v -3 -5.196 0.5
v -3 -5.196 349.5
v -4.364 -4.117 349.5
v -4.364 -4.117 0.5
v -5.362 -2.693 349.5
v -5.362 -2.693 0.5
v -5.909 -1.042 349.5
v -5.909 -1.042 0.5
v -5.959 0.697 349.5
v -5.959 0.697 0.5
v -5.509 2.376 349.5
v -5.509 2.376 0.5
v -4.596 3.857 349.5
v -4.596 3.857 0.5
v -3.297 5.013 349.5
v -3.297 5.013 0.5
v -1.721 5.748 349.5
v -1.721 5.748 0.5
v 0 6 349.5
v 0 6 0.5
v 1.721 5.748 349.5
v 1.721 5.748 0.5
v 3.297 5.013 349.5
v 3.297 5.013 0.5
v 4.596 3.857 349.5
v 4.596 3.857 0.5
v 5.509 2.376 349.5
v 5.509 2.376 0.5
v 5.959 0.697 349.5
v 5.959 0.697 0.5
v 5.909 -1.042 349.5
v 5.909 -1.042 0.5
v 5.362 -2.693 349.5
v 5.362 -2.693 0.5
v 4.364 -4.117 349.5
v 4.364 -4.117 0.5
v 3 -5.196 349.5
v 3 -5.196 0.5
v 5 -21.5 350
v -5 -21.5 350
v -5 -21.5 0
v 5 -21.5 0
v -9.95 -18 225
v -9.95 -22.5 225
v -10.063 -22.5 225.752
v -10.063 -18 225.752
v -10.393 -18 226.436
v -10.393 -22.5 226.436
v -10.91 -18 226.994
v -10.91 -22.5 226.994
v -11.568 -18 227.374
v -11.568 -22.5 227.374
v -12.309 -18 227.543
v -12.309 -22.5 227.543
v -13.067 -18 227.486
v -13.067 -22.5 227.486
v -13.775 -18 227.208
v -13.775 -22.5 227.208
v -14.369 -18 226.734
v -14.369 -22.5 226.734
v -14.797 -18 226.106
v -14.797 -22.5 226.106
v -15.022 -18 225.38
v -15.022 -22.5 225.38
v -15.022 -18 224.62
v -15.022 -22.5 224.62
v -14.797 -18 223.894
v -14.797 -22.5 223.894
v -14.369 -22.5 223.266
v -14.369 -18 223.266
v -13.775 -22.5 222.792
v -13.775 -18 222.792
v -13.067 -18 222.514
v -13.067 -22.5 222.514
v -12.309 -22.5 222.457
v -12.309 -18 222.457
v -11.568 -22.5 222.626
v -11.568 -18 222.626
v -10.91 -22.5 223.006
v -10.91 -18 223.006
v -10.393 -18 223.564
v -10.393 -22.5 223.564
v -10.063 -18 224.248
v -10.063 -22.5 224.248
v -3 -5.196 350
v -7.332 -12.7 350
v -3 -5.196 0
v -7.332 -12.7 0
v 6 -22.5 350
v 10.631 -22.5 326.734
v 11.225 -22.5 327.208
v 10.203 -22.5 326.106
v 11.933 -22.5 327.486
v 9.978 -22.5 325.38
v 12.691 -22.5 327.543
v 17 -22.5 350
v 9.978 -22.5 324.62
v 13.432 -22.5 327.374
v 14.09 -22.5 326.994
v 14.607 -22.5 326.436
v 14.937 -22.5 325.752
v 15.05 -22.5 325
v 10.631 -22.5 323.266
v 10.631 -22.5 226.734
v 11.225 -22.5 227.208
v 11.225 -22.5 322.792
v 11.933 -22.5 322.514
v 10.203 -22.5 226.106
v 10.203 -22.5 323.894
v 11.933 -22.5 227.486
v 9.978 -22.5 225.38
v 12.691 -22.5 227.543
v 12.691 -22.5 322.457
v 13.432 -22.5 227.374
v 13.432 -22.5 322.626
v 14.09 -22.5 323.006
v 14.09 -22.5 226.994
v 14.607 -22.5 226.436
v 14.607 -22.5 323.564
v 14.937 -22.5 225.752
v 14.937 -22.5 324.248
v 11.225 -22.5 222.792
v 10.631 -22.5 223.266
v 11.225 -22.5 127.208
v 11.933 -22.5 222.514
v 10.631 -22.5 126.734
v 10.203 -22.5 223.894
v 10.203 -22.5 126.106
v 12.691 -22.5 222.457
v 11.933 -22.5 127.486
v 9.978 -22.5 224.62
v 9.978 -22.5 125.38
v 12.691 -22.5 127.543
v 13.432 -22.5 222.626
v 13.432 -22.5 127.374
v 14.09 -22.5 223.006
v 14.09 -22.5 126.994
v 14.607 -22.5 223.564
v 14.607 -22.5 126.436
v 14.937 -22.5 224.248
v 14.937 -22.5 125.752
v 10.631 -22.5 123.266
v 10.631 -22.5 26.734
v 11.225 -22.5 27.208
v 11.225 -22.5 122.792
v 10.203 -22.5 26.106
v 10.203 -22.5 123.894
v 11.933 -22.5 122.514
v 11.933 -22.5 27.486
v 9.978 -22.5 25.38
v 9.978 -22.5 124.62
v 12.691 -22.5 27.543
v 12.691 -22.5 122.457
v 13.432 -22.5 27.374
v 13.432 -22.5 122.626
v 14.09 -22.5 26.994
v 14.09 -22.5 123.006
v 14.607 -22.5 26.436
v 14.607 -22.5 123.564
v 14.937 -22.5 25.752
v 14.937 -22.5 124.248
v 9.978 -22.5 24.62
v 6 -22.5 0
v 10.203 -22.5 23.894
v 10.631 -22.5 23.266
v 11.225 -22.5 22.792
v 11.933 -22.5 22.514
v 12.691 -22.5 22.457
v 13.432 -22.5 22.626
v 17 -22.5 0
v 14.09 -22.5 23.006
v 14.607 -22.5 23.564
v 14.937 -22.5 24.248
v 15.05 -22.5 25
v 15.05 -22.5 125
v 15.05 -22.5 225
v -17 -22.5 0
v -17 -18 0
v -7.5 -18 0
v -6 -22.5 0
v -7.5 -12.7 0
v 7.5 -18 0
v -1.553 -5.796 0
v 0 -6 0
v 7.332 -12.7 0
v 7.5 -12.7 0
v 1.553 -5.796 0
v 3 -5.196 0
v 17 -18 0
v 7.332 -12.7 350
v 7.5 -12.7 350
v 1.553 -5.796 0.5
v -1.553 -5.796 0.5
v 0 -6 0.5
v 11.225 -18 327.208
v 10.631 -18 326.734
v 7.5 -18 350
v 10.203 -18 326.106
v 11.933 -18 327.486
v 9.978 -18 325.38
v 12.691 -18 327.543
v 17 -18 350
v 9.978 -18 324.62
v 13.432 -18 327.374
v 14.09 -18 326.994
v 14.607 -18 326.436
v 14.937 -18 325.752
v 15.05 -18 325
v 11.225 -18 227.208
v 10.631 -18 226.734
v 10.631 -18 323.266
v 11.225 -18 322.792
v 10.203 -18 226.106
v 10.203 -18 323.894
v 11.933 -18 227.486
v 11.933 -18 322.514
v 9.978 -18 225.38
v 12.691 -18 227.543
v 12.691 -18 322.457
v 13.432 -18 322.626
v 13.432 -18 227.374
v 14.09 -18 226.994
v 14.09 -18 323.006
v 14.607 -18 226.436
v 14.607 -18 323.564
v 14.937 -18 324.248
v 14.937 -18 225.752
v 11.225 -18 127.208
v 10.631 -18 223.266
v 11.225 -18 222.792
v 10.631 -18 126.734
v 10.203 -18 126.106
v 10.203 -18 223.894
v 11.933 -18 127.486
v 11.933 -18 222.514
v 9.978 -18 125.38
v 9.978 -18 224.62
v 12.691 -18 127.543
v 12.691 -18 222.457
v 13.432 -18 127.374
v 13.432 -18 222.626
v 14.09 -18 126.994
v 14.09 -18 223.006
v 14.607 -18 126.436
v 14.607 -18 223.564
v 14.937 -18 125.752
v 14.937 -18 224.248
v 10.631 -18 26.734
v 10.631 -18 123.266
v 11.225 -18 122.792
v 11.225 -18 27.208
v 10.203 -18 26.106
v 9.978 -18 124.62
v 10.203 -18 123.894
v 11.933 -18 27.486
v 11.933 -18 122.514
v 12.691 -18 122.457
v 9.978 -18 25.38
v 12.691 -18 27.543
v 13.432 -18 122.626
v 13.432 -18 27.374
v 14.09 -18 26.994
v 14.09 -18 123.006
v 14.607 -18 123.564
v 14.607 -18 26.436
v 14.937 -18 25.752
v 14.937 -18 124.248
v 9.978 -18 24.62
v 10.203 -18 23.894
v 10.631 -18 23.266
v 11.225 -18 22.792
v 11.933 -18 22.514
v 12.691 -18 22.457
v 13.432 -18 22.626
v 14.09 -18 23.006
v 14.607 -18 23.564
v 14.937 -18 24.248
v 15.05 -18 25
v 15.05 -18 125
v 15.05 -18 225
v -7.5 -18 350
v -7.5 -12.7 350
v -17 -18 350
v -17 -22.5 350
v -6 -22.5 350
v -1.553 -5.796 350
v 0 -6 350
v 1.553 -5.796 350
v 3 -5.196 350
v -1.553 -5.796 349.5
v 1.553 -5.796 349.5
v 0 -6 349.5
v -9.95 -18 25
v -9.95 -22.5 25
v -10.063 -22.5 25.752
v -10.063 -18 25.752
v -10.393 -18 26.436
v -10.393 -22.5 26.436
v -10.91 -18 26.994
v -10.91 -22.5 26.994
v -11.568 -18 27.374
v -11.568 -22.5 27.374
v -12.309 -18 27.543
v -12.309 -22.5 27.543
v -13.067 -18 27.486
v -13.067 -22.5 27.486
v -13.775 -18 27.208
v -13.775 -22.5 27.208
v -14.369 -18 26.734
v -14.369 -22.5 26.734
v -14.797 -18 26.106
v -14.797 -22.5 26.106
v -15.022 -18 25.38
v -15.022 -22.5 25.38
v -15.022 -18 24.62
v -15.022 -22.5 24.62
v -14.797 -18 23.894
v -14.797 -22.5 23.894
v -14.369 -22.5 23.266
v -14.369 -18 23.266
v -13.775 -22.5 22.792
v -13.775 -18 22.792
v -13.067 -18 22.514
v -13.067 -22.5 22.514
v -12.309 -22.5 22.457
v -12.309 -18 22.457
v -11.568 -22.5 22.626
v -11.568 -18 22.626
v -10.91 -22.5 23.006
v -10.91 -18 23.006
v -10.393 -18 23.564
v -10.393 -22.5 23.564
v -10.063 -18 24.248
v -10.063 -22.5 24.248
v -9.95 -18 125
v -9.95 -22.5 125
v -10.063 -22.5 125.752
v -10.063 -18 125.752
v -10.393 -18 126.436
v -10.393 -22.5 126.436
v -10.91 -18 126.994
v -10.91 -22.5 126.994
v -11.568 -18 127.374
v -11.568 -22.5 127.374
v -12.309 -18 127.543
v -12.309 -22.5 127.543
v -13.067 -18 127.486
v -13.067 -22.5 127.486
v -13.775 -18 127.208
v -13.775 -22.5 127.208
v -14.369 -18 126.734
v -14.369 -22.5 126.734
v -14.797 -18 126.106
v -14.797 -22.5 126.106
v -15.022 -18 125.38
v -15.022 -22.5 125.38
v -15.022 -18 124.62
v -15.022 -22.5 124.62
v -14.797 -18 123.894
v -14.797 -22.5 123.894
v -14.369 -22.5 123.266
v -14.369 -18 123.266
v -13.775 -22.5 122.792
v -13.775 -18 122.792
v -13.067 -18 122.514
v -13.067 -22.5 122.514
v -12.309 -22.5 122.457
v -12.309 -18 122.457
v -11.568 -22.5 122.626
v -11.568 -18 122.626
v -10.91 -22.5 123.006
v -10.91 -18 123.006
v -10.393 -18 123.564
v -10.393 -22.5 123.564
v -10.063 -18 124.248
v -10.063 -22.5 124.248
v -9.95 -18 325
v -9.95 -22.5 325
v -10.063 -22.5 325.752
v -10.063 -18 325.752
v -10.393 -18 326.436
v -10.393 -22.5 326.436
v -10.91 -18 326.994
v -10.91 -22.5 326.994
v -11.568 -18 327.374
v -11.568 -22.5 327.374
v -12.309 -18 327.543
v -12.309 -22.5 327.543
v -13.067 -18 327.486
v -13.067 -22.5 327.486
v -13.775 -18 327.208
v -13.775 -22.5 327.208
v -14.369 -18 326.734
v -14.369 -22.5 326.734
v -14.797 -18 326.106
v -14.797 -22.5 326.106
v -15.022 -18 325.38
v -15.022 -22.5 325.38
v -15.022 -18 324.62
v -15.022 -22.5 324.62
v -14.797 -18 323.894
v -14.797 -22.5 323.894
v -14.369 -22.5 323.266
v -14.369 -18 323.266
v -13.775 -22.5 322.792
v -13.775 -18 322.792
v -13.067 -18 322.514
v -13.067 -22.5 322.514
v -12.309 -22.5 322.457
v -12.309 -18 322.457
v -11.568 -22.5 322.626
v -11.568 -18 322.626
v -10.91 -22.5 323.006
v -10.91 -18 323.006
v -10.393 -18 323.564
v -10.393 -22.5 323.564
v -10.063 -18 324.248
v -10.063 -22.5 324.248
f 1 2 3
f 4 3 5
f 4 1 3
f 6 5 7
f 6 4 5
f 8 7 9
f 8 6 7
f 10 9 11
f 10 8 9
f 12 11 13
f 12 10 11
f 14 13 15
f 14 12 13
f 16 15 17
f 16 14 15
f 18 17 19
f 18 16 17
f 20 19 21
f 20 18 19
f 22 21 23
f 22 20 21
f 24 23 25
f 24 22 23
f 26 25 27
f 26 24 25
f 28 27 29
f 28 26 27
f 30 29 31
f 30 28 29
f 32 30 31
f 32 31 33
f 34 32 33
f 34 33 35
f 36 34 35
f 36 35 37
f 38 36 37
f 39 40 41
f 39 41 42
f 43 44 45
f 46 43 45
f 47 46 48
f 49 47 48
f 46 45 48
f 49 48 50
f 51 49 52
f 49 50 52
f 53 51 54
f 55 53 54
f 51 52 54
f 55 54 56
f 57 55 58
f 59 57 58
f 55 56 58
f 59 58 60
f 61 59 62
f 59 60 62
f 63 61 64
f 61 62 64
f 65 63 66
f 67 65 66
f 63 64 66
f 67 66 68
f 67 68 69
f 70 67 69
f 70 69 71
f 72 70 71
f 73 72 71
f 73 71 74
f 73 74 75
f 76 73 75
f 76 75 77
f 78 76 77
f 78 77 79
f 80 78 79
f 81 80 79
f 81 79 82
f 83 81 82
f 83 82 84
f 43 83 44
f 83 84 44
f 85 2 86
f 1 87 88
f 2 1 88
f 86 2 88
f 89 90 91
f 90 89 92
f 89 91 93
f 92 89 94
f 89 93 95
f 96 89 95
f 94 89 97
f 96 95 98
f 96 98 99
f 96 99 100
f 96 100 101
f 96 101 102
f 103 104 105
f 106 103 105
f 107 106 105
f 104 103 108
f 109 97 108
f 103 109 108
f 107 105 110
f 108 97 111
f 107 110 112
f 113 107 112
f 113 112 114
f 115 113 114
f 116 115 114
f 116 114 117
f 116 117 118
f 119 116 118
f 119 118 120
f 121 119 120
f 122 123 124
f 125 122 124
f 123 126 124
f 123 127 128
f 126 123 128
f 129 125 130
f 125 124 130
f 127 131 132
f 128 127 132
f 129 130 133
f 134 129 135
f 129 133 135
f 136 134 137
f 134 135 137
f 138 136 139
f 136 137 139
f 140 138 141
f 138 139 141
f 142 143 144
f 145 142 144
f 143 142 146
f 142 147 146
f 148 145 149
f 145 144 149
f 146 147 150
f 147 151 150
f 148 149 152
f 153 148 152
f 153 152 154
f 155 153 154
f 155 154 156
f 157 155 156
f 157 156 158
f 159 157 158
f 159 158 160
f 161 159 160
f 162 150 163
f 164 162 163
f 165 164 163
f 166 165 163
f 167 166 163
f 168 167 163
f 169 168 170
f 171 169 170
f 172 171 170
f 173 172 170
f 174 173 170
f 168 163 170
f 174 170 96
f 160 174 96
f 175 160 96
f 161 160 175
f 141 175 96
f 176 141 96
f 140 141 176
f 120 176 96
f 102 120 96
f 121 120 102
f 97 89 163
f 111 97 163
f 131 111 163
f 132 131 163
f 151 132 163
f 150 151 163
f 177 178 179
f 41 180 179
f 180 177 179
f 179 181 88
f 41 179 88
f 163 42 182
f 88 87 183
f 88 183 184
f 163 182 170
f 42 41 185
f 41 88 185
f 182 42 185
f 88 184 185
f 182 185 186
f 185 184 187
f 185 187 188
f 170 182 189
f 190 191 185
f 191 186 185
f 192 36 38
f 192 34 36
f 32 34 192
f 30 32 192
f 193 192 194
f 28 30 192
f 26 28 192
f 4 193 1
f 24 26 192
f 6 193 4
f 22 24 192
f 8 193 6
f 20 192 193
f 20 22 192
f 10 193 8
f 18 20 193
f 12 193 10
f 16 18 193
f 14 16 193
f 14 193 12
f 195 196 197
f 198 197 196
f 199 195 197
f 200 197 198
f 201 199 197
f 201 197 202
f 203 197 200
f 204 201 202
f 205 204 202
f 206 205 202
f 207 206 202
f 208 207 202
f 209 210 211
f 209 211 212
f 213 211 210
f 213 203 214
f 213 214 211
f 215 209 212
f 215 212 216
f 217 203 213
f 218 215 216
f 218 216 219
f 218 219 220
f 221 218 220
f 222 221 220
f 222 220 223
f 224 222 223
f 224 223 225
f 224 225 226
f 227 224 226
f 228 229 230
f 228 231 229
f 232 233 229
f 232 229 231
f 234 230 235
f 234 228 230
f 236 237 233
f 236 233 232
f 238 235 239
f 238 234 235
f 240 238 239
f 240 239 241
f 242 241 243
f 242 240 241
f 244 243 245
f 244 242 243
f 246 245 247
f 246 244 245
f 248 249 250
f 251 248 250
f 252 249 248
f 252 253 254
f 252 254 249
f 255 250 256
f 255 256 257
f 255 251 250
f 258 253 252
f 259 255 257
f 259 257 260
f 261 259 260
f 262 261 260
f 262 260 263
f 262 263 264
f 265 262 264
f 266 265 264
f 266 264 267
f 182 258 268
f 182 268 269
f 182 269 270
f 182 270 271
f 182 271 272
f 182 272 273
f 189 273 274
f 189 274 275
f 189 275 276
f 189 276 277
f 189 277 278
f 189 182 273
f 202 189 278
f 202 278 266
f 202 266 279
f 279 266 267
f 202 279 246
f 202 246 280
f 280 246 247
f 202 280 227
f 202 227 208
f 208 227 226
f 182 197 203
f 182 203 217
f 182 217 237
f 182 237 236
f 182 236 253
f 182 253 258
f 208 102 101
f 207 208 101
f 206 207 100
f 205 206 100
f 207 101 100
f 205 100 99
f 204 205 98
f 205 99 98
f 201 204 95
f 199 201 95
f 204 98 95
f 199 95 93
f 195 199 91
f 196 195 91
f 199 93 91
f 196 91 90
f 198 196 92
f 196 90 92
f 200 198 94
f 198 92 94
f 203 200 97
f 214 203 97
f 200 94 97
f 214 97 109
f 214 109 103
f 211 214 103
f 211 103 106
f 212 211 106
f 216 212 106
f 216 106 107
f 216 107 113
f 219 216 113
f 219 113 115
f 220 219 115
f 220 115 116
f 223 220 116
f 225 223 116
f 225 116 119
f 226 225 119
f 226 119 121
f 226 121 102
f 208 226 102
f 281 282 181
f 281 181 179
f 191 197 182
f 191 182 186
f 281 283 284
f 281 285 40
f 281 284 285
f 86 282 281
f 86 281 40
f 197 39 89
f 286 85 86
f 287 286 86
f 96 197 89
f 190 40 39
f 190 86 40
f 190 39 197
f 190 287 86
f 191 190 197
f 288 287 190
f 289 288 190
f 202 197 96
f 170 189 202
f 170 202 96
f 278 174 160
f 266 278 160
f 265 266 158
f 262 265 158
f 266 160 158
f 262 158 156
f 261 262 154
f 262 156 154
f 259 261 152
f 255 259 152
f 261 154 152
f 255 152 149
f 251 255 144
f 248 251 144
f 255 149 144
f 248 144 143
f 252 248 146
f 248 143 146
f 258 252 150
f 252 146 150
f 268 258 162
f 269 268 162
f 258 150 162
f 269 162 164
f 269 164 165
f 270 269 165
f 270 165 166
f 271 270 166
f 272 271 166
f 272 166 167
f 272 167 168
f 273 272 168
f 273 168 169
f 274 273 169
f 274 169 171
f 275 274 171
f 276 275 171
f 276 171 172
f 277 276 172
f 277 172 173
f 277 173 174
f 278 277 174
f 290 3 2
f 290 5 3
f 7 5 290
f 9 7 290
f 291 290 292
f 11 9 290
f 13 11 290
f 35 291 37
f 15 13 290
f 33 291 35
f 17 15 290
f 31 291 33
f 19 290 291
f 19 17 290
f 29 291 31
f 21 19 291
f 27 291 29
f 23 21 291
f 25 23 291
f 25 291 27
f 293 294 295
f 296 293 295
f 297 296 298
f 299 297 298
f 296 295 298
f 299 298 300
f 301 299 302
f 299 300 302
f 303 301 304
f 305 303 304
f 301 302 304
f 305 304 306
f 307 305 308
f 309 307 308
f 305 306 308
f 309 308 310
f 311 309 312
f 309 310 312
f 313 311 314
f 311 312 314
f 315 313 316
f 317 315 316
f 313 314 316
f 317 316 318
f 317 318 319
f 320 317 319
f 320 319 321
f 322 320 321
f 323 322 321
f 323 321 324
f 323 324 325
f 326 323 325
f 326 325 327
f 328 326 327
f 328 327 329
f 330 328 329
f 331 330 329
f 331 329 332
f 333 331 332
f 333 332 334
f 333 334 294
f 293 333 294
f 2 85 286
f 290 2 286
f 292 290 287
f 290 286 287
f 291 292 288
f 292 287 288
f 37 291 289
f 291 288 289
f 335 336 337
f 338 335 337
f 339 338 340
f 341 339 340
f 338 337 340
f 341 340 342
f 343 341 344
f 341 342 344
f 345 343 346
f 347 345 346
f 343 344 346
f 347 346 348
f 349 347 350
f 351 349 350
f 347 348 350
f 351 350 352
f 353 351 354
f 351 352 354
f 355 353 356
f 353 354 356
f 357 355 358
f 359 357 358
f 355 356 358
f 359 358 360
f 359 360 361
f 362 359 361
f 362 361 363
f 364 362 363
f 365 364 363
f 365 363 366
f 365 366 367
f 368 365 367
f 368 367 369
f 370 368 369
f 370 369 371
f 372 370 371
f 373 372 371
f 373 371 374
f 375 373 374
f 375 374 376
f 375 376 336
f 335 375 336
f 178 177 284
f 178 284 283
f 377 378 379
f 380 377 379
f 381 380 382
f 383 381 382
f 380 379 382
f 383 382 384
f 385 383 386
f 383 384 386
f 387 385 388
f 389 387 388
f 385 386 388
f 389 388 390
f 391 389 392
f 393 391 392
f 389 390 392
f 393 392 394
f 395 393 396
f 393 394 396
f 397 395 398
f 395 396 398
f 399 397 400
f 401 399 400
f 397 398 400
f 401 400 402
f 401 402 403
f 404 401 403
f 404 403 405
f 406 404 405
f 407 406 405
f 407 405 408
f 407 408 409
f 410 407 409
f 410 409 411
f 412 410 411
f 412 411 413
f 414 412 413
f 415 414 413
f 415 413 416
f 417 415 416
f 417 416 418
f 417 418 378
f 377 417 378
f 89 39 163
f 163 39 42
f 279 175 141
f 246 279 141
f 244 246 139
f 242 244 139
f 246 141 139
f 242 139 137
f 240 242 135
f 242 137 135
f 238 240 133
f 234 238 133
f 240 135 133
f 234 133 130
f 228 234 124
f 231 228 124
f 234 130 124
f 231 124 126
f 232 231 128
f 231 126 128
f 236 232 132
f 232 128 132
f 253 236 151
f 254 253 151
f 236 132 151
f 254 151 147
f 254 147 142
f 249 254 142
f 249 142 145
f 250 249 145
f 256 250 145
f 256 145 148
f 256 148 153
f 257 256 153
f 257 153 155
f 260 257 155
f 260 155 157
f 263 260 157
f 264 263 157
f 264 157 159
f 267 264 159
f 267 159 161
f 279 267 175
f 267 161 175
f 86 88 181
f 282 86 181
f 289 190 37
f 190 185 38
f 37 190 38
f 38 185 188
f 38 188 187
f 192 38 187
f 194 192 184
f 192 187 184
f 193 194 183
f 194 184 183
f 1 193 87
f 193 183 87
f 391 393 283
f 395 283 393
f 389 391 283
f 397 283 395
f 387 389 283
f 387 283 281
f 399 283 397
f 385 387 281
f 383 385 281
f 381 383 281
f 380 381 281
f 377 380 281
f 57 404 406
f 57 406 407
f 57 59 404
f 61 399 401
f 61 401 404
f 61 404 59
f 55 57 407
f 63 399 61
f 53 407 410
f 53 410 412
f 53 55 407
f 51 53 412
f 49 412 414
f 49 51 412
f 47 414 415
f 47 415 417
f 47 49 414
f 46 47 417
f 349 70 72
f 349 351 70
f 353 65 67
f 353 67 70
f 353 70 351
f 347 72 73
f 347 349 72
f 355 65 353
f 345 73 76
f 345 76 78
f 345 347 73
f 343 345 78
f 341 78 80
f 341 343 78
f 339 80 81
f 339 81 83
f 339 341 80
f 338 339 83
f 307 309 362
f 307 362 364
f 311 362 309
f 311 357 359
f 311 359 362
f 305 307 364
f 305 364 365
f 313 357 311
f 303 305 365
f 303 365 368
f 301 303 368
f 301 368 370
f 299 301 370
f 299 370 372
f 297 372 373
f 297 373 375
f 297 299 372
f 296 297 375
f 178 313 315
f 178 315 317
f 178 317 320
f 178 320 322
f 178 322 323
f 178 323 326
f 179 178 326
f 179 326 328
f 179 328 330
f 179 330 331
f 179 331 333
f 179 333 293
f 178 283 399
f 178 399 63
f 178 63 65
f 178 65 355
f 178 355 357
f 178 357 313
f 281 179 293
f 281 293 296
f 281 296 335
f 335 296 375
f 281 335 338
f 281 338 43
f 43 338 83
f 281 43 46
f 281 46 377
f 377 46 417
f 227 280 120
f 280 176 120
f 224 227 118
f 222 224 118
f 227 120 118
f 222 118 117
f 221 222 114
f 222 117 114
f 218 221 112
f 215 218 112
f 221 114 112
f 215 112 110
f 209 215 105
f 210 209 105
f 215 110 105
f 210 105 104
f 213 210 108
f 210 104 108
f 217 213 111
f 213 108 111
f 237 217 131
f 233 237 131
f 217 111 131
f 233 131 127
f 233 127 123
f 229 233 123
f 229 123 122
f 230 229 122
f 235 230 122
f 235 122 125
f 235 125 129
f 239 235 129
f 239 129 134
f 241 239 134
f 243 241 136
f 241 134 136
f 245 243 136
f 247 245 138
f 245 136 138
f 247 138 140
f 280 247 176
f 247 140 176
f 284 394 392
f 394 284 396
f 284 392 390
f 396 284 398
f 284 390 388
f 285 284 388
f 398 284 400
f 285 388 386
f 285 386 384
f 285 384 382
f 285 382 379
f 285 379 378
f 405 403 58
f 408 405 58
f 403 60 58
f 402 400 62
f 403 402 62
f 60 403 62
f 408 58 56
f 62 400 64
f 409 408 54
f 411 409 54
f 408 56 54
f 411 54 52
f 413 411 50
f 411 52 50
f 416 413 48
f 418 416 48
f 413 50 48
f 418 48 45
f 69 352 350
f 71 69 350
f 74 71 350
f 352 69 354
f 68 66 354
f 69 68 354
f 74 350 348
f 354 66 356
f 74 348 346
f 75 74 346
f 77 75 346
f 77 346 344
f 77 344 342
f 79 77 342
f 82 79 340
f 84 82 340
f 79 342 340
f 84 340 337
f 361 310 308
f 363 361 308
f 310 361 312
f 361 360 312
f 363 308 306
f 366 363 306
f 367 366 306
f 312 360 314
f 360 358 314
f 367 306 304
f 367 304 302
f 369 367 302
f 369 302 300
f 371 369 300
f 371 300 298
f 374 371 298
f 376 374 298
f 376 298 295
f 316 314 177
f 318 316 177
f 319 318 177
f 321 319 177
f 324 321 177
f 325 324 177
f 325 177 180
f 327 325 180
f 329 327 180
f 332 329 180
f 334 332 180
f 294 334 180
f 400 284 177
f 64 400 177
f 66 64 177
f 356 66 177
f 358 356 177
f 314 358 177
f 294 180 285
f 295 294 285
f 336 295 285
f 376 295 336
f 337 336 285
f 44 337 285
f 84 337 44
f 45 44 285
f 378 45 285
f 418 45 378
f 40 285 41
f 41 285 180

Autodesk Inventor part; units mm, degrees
ref_plane "YZ Plane" through (0, 0, 0) normal (1, 0, 0) x (0, 1, 0)
ref_plane "XZ Plane" through (0, 0, 0) normal (0, 1, 0) x (-1, 0, 0)
ref_plane "XY Plane" through (0, 0, 0) normal (0, 0, 1) x (1, 0, 0)
sketch "Sketch1" plane through (0, 0, 0) normal (0, 0, 1) x (1, 0, 0)
  circle A0 centre (0, 0) radius 6
  line L0 (-3, -5.1962) -> (-7.3323, -12.7)
  line L1 (-7.3323, -12.7) -> (7.3323, -12.7)
  line L2 (7.3323, -12.7) -> (3, -5.1962)
  line L3 (-7.5, -22.5) -> (7.5, -22.5)
  line L4 (7.5, -22.5) -> (7.5, -12.7)
  line L5 (7.5, -12.7) -> (-7.5, -12.7)
  line L6 (-7.5, -12.7) -> (-7.5, -22.5)
  line L7 (0, -12.7) -> (0, 0)
  line L8 (-17, -18) -> (17, -18)
  line L9 (17, -18) -> (17, -22.5)
  line L10 (17, -22.5) -> (-17, -22.5)
  line L11 (-17, -22.5) -> (-17, -18)
  point P0 (0, -22.5)
  dimension "d0" = 12
  dimension "d1" = 60
  dimension "d2" = 3
  dimension "d3" = 3
  dimension "d4" = 15
  dimension "d5" = 9.8
  dimension "d7" = 4.5
  dimension "d8" = 34
  dimension "d31" = 22.5
extrude "Extrusion1" add sketch "Sketch1" along normal blind 350
sketch "Sketch2" plane through (0, 0, 350) normal (0, 0, 1) x (1, 0, 0)
  arc A0 (3, -5.1962) -> (-3, -5.1962) centre (0, 0) ccw projected
  line L0 (3, -5.1962) -> (7.3323, -12.7) projected
  line L1 (7.3323, -12.7) -> (7.5, -12.7) projected
  line L2 (7.5, -12.7) -> (7.5, -18) projected
  line L3 (7.5, -18) -> (17, -18) projected
  line L4 (17, -18) -> (17, -22.5) projected
  line L5 (17, -22.5) -> (-17, -22.5) projected
  line L6 (-17, -22.5) -> (-17, -18) projected
  line L7 (-17, -18) -> (-7.5, -18) projected
  line L8 (-7.5, -18) -> (-7.5, -12.7) projected
  line L9 (-7.5, -12.7) -> (-7.3323, -12.7) projected
  line L10 (-7.3323, -12.7) -> (-3, -5.1962) projected
  line L11 (-6, -21.5) -> (6, -21.5)
  line L12 (6, -21.5) -> (6, -22.5)
  line L13 (6, -22.5) -> (-6, -22.5)
  line L14 (-6, -22.5) -> (-6, -21.5)
  point P0 (0, -22.5)
  dimension "d11" = 12
  dimension "d12" = 1
extrude "Extrusion2" cut sketch "Sketch2" against normal through all contours L5 L14 L11 L12
chamfer "Chamfer1" distance 1 angle 45 2 edges at (-6, -21.5, 175) (6, -21.5, 175)
sketch "Sketch3" plane through (-17, -22.5, 0) normal (0, -1, 0) x (1, 0, 0)
  line L0 (23, 0) -> (23, 350) construction
  line L1 (23, 350) -> (34, 350) projected
  line L2 (34, 350) -> (34, 0) projected
  line L3 (34, 0) -> (23, 0) construction
  line L4 (11, 350) -> (11, 0) construction
  line L5 (11, 0) -> (0, 0) construction
  line L6 (0, 0) -> (0, 350) projected
  line L7 (0, 350) -> (11, 350) projected
  circle A0 centre (4.5, 25) radius 2.55
  circle A1 centre (29.5, 25) radius 2.55
  line L8 (29.5, 25) -> (4.5, 25) construction
  line L9 (17, 25) -> (17, 0) construction
  dimension "d18" = 25
  dimension "d19" = 5.1
  dimension "d20" = 5.1
  dimension "d21" = 25
extrude "Extrusion3" cut sketch "Sketch3" against normal through all
pattern_linear "Rectangular Pattern1" count 4 spacing 100 along (0, 0, 1) of "Extrusion3"
sketch "Sketch4" plane through (0, 0, 0) normal (0, 0, -1) x (-1, 0, 0)
  line L0 (-5, -21.5) -> (-6, -22.5) projected
  line L1 (-5, -21.5) -> (5, -21.5) projected
  line L2 (6, -22.5) -> (5, -21.5) projected
  line L3 (17, -22.5) -> (6, -22.5) projected
  line L4 (17, -18) -> (17, -22.5) projected
  line L5 (7.5, -18) -> (17, -18) projected
  line L6 (7.5, -12.7) -> (7.5, -18) projected
  line L7 (7.3323, -12.7) -> (7.5, -12.7) projected
  line L8 (3, -5.1962) -> (7.3323, -12.7) projected
  arc A0 (3, -5.1962) -> (-3, -5.1962) centre (0, 0) ccw projected
  line L9 (-7.3323, -12.7) -> (-3, -5.1962) projected
  line L10 (-7.5, -12.7) -> (-7.3323, -12.7) projected
  line L11 (-7.5, -18) -> (-7.5, -12.7) projected
  line L12 (-17, -18) -> (-7.5, -18) projected
  line L13 (-17, -22.5) -> (-17, -18) projected
  line L14 (-6, -22.5) -> (-17, -22.5) projected
  circle A1 centre (0, 0) radius 6
extrude "Extrusion4" cut sketch "Sketch4" against normal blind 0.5 contours A0 A1
sketch "Sketch5" plane through (0, 0, 350) normal (0, 0, 1) x (1, 0, 0)
  line L0 (6, -22.5) -> (17, -22.5) projected
  line L1 (17, -22.5) -> (17, -18) projected
  line L2 (17, -18) -> (7.5, -18) projected
  line L3 (7.5, -18) -> (7.5, -12.7) projected
  line L4 (7.5, -12.7) -> (7.3323, -12.7) projected
  line L5 (7.3323, -12.7) -> (3, -5.1962) projected
  arc A0 (3, -5.1962) -> (-3, -5.1962) centre (0, 0) ccw projected
  line L6 (-3, -5.1962) -> (-7.3323, -12.7) projected
  line L7 (-7.3323, -12.7) -> (-7.5, -12.7) projected
  line L8 (-7.5, -12.7) -> (-7.5, -18) projected
  line L9 (-7.5, -18) -> (-17, -18) projected
  line L10 (-17, -18) -> (-17, -22.5) projected
  line L11 (-17, -22.5) -> (-6, -22.5) projected
  line L12 (-5, -21.5) -> (-6, -22.5) projected
  line L13 (-5, -21.5) -> (5, -21.5) projected
  line L14 (6, -22.5) -> (5, -21.5) projected
  circle A1 centre (0, 0) radius 6
extrude "Extrusion5" cut sketch "Sketch5" against normal blind 0.5 contours A1 A0
properties part number "sbr12_350mm"
